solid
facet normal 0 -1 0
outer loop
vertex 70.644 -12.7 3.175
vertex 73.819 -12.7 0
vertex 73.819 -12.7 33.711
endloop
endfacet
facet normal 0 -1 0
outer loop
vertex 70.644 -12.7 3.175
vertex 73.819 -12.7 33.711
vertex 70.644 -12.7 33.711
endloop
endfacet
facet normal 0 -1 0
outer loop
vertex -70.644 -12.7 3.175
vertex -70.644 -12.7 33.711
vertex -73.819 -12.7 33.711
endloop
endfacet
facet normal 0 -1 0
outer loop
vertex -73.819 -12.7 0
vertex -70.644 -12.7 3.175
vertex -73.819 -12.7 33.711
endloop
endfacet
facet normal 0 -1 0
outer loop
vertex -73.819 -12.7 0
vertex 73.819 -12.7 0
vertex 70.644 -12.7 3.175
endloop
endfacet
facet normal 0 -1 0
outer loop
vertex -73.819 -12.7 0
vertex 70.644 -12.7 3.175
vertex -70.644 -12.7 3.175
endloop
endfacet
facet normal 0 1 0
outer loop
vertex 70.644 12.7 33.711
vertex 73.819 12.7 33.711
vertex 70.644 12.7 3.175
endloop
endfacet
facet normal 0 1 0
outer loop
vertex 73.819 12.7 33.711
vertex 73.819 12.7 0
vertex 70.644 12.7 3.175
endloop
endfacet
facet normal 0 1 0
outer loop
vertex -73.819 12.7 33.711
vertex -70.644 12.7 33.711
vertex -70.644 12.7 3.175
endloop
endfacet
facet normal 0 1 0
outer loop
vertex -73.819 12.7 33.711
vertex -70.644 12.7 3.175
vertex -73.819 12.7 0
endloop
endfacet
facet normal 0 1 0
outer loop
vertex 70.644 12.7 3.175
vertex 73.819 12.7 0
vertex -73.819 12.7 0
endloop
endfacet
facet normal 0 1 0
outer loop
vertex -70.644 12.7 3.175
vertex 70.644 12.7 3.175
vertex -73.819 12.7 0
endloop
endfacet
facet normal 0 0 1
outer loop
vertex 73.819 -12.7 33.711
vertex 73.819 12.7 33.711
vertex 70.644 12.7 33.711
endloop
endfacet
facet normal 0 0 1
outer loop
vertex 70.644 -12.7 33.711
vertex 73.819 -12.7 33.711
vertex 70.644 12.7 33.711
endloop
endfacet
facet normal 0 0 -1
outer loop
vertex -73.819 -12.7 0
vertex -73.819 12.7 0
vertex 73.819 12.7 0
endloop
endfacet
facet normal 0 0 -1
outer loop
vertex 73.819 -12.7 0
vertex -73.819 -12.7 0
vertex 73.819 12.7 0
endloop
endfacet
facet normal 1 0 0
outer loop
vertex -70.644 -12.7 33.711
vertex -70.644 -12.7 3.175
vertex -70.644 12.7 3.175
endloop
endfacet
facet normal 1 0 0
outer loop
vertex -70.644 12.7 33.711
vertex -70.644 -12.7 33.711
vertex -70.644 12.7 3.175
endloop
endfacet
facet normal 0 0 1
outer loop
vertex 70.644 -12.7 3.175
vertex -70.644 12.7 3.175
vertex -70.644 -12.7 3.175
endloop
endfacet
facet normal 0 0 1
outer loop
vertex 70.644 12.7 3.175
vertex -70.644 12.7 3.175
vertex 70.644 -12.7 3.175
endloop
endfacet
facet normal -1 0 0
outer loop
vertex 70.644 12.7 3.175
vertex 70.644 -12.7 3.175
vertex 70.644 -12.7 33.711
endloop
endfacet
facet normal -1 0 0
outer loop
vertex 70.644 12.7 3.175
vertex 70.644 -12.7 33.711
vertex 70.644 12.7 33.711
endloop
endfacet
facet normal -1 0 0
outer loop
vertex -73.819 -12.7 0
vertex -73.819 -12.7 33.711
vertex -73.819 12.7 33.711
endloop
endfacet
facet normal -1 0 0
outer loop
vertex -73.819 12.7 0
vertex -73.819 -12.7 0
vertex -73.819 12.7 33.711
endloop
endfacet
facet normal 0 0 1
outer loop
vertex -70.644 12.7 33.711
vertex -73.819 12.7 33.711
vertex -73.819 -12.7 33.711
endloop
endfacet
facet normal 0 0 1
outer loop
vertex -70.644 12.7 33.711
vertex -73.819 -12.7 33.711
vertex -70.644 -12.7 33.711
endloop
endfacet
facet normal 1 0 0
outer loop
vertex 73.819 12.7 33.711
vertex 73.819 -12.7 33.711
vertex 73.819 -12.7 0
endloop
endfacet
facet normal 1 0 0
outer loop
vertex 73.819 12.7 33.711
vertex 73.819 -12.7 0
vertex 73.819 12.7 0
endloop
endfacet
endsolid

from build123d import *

# Parameters (mm, degrees)
SKETCH1_W           = 147.6375
SKETCH1_H           = 25.4
BOSS_EXTRUDE1_DEPTH = 3.175
SKETCH2_W           = 3.175
SKETCH2_H           = 25.4
BOSS_EXTRUDE2_DEPTH = 30.53588


with BuildPart() as part:
    # Sketch1 → Boss-Extrude1 (new body)
    with BuildSketch(Plane.XY):
        Rectangle(SKETCH1_W, SKETCH1_H)
    extrude(amount=BOSS_EXTRUDE1_DEPTH)

    # Sketch2 → Boss-Extrude2 (add)
    with BuildSketch(Plane.XY.offset(3.175)):
        with Locations((-72.23125, 0)):
            Rectangle(SKETCH2_W, SKETCH2_H)
    boss_extrude2 = extrude(amount=BOSS_EXTRUDE2_DEPTH)

    # Mirror1: Boss-Extrude2 across plane
    add(boss_extrude2.mirror(Plane(origin=(0, 0, 0), x_dir=(0, 0, 1), z_dir=(1, 0, 0))))


solid = part.part
